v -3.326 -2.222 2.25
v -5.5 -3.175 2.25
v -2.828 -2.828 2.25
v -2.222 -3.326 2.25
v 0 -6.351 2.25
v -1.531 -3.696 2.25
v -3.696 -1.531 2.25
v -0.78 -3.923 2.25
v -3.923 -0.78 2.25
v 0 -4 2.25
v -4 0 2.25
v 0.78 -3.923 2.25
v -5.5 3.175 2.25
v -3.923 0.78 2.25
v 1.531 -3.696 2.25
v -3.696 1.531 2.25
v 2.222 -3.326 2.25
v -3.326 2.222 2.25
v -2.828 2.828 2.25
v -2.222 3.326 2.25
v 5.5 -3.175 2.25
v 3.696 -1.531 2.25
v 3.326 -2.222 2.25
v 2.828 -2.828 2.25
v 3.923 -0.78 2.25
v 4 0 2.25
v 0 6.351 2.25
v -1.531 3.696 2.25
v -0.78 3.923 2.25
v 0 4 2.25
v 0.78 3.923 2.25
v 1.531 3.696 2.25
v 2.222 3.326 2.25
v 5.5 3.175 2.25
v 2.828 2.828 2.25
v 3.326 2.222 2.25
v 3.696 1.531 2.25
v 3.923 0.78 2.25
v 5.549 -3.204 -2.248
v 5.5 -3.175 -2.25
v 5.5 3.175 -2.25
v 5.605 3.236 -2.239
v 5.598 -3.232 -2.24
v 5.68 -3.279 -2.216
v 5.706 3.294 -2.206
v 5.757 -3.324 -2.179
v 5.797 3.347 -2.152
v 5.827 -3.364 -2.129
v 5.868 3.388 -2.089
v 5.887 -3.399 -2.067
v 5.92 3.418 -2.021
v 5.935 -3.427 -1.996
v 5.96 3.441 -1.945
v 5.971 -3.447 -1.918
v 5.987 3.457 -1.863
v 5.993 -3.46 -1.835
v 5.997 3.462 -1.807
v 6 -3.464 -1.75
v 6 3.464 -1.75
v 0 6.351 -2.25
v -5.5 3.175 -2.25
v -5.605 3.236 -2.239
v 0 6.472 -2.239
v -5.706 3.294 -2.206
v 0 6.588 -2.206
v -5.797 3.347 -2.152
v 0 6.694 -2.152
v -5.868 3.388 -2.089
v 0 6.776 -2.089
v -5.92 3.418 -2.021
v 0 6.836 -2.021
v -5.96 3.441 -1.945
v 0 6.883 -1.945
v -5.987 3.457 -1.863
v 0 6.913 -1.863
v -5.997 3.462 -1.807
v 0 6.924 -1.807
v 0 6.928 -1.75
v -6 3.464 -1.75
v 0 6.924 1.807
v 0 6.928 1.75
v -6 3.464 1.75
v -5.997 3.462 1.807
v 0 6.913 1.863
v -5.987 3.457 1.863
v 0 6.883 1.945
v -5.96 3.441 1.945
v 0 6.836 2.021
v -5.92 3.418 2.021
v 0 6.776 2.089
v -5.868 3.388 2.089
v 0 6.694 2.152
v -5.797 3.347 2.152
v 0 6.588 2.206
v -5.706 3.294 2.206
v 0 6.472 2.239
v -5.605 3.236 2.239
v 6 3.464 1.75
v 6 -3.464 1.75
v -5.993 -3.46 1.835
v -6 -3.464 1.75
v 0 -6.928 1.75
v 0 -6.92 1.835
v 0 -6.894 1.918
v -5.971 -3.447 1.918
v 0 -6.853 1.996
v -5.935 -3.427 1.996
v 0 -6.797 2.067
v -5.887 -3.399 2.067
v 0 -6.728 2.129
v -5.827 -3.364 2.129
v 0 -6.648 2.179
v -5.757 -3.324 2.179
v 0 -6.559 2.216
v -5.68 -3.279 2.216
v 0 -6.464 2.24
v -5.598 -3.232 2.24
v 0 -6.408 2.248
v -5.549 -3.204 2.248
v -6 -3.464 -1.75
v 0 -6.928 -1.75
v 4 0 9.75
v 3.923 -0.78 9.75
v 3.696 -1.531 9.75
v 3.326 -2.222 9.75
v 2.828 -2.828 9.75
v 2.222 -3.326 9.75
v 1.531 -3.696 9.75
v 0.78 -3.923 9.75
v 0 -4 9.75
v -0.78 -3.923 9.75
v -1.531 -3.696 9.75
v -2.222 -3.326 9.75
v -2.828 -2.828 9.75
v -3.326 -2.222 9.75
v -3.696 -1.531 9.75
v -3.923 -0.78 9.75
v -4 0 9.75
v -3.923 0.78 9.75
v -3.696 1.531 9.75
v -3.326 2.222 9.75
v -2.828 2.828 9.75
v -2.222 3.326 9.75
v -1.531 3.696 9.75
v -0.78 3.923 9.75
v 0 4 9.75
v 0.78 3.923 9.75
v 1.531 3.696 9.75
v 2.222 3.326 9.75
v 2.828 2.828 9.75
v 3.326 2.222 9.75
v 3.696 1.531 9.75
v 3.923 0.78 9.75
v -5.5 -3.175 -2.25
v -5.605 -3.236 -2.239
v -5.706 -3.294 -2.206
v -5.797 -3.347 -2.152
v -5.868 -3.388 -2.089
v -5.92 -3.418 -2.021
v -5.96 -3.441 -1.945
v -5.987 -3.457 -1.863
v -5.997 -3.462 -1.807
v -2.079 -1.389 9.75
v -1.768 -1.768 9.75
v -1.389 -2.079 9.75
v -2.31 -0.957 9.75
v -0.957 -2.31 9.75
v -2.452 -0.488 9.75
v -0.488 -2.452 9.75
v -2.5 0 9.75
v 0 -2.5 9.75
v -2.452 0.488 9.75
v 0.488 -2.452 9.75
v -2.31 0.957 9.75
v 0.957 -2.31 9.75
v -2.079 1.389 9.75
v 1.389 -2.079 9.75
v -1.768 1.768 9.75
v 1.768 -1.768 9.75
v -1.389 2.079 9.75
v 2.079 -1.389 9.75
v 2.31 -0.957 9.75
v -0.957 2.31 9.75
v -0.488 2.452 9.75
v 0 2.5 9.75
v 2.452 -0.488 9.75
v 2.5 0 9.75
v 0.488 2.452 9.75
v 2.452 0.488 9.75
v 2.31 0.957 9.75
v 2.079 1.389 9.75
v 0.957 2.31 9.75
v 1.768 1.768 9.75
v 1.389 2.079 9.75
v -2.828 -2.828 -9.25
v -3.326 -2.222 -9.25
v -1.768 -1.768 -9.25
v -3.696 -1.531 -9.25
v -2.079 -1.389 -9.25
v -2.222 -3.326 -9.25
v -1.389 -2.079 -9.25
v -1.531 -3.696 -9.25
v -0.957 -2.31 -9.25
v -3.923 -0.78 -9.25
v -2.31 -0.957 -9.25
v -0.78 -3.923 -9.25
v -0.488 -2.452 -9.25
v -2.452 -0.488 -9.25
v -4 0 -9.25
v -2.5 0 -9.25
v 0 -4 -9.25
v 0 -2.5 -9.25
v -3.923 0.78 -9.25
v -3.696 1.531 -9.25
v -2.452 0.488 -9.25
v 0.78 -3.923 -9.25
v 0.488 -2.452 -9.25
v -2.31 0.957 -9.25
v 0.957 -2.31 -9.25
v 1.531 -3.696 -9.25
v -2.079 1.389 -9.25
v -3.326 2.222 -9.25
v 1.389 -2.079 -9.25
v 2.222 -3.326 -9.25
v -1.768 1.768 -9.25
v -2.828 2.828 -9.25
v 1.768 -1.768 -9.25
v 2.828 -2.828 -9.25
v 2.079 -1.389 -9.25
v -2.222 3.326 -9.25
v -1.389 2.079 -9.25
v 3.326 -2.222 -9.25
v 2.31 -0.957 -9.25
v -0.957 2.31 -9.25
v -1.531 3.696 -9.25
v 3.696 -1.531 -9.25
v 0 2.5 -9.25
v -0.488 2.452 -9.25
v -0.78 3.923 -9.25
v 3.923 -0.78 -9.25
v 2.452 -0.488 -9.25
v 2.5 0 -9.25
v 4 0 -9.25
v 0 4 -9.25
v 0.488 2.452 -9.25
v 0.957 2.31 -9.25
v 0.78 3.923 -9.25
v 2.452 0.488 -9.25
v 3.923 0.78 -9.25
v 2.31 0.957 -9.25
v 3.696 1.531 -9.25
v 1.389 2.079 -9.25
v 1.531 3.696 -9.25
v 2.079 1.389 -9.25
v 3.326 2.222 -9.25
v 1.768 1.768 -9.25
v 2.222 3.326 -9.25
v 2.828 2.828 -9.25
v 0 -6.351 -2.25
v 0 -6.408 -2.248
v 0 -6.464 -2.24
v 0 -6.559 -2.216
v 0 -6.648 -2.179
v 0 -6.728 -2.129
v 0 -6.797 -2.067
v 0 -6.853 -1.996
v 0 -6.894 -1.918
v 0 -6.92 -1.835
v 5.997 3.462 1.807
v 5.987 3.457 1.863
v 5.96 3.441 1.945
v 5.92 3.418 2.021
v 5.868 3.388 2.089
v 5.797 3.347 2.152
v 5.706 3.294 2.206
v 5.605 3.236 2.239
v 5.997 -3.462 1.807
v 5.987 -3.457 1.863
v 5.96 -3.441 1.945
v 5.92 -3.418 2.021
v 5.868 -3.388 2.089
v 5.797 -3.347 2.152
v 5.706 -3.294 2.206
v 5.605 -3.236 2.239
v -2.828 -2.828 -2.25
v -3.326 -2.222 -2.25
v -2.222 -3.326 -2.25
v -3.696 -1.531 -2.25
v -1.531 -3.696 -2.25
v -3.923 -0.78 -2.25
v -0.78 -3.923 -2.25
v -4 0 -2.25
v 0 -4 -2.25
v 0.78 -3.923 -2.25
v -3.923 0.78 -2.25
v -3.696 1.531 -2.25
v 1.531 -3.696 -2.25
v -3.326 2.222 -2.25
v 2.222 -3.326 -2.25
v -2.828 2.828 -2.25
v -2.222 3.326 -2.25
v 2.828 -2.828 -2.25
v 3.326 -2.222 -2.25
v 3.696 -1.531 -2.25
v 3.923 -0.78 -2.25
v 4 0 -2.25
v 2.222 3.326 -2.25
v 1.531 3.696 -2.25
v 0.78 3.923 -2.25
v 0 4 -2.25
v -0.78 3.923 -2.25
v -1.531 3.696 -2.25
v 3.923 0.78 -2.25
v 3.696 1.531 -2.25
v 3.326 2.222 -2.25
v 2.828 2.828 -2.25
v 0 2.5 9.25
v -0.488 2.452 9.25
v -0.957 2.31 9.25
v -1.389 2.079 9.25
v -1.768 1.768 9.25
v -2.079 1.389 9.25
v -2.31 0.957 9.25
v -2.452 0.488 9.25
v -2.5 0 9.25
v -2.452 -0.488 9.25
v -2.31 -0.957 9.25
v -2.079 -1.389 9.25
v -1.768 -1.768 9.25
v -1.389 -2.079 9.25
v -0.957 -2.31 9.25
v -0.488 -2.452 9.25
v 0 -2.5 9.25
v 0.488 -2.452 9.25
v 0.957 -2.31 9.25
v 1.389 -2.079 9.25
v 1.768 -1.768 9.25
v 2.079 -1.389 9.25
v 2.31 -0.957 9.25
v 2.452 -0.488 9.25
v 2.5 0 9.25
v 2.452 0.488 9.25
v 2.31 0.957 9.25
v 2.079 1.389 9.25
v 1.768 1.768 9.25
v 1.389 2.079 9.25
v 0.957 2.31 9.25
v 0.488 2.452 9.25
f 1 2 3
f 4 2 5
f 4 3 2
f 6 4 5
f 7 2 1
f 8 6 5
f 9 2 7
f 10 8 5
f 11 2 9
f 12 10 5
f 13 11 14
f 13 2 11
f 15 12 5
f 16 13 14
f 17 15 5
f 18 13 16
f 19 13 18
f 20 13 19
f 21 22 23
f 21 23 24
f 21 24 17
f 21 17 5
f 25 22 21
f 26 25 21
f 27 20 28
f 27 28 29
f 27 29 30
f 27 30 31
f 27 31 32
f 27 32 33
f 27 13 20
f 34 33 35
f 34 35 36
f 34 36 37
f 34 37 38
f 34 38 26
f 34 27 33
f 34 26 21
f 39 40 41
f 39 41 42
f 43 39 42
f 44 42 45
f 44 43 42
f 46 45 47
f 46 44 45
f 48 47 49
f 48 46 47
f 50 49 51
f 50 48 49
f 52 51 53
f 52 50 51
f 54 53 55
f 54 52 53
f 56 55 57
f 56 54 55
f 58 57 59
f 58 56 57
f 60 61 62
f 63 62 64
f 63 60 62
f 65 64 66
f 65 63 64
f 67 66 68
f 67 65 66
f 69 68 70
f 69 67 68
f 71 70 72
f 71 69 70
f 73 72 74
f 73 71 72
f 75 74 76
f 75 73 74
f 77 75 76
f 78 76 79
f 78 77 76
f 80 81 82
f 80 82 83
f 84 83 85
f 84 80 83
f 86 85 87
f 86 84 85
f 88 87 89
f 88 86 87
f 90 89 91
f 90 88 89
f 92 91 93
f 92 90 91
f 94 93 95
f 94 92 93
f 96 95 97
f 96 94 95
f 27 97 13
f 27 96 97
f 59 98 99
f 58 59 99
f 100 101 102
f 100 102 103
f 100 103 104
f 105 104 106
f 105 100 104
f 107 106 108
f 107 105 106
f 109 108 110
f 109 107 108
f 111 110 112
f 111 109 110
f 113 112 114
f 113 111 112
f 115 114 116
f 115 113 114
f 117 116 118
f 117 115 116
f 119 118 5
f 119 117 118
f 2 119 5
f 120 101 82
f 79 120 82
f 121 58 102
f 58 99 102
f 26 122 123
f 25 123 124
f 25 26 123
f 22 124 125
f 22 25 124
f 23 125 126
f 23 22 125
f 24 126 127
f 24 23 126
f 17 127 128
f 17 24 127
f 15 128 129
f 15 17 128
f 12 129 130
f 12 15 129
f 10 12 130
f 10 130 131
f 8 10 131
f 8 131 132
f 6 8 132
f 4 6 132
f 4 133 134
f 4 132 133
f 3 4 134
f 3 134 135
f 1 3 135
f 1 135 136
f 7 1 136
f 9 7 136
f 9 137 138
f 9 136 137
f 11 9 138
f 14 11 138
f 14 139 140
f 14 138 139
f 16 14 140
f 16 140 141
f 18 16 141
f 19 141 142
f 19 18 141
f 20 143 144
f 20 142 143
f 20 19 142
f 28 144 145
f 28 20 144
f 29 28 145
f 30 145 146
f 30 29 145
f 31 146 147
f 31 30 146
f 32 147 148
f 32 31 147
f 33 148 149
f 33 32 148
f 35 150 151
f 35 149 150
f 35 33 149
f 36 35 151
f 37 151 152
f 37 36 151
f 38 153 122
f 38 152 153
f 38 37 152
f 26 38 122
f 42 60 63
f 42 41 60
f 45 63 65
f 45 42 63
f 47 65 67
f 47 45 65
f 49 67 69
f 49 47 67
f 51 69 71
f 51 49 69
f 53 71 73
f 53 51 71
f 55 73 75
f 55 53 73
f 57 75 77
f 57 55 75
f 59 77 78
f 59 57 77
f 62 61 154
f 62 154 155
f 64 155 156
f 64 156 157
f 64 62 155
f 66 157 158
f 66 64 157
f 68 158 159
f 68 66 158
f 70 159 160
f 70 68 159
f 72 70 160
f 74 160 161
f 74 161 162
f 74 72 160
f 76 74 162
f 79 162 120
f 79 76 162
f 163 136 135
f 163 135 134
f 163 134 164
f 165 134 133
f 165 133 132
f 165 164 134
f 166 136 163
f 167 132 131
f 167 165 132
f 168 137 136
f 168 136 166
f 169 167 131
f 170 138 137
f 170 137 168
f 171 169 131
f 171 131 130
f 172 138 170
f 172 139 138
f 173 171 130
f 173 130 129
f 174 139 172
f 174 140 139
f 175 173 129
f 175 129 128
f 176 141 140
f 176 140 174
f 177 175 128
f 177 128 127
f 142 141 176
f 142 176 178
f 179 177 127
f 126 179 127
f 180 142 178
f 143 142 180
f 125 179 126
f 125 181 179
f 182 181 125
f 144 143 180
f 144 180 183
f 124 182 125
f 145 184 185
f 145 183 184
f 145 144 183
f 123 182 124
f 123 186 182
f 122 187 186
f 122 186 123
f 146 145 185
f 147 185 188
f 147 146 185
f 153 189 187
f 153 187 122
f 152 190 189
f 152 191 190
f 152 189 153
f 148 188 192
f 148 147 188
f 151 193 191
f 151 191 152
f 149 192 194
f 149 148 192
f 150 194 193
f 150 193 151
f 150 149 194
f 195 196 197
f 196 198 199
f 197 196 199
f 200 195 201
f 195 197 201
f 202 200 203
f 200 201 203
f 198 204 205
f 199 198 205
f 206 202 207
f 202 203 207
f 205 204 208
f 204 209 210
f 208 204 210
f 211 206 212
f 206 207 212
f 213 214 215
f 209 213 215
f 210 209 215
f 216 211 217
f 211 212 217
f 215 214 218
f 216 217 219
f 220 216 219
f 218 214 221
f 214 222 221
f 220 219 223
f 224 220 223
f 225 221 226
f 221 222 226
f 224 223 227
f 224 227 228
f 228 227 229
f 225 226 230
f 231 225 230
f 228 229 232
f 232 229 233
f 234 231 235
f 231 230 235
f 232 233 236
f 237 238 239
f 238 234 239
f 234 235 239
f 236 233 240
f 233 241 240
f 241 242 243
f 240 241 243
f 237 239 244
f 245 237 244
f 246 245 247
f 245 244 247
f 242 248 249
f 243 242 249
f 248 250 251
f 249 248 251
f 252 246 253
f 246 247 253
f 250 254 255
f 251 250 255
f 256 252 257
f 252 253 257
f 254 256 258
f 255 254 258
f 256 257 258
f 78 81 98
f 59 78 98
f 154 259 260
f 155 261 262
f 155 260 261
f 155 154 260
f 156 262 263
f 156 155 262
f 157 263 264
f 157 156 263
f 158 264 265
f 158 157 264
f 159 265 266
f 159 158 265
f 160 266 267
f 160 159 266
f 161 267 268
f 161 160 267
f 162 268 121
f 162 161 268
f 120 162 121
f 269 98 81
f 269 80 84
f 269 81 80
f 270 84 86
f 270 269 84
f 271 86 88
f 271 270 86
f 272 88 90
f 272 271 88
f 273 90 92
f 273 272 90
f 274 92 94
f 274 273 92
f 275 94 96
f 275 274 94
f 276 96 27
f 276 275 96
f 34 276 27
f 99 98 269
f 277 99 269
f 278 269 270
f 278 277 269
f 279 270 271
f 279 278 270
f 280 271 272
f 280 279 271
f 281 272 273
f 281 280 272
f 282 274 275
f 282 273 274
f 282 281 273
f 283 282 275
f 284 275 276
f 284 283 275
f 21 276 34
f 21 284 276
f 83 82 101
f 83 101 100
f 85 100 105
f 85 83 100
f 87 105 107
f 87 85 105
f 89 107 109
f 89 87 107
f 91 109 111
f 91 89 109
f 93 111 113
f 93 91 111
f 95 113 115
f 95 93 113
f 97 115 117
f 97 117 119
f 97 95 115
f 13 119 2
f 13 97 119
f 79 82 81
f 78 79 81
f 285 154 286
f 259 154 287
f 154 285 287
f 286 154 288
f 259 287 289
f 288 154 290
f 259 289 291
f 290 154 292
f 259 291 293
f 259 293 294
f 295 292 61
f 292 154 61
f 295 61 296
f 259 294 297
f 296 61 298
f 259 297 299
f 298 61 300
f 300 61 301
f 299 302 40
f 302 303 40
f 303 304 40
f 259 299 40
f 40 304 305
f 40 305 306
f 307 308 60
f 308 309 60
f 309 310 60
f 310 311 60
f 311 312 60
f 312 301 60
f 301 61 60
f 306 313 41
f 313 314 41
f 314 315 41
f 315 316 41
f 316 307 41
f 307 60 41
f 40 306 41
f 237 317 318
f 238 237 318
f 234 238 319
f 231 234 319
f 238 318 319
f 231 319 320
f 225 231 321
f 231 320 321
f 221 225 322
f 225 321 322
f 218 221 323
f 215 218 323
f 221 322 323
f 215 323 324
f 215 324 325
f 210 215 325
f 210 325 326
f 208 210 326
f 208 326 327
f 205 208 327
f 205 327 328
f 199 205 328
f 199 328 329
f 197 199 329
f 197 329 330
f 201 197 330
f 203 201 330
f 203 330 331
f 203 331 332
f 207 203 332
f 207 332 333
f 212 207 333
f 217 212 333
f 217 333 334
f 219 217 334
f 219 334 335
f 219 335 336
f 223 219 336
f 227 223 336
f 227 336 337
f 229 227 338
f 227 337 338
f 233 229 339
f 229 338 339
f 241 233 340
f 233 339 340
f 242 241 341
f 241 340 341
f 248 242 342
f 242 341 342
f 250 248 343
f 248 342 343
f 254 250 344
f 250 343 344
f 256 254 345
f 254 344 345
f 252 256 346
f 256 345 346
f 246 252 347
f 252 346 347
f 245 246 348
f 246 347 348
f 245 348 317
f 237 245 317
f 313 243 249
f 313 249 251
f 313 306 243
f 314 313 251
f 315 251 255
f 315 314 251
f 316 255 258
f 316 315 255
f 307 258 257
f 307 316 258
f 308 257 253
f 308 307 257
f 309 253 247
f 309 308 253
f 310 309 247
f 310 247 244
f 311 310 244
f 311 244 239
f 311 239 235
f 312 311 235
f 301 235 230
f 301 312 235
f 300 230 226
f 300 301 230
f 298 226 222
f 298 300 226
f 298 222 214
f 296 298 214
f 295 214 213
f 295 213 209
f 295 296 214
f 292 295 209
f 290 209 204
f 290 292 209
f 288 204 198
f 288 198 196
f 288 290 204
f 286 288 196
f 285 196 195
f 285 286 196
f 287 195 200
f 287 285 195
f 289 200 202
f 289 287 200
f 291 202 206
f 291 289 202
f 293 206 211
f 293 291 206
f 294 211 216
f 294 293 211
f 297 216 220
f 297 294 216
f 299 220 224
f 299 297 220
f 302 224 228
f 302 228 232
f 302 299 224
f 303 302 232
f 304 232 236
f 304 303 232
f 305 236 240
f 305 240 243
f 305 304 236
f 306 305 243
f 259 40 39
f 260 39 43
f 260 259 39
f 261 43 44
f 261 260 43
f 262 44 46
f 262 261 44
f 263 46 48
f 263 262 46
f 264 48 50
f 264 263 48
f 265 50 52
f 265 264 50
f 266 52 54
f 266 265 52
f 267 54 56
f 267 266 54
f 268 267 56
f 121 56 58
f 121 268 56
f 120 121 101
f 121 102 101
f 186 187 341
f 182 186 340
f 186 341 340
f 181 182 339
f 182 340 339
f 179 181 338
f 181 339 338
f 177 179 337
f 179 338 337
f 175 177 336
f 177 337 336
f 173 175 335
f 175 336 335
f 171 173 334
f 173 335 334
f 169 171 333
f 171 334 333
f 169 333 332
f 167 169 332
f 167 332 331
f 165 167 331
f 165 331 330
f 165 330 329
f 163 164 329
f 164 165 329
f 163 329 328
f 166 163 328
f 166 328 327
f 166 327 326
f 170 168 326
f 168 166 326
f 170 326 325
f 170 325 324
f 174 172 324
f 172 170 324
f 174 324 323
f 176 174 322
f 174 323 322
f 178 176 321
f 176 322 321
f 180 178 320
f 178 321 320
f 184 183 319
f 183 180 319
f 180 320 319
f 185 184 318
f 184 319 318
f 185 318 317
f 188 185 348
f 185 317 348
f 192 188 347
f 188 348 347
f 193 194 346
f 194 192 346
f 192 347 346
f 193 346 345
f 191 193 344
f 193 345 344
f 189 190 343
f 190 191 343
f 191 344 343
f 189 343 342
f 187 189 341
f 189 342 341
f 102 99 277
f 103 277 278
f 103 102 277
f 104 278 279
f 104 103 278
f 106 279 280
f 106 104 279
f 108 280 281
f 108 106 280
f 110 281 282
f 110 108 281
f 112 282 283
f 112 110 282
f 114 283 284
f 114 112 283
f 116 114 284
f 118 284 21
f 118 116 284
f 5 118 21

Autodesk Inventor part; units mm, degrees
ref_plane "YZ Plane" through (0, 0, 0) normal (1, 0, 0) x (0, 1, 0)
ref_plane "XZ Plane" through (0, 0, 0) normal (0, 1, 0) x (-1, 0, 0)
ref_plane "XY Plane" through (0, 0, 0) normal (0, 0, 1) x (1, 0, 0)
sketch "Sketch1" plane through (0, 0, 0) normal (0, 0, 1) x (1, 0, 0)
  line L0 (0, -6.9282) -> (-6, -3.4641)
  line L1 (-6, -3.4641) -> (-6, 3.4641)
  line L2 (-6, 3.4641) -> (0, 6.9282)
  line L3 (0, 6.9282) -> (6, 3.4641)
  line L4 (6, 3.4641) -> (6, -3.4641)
  line L5 (6, -3.4641) -> (0, -6.9282)
  circle A0 centre (0, 0) radius 4
  dimension "d0" = 12
  dimension "d1" = 8
extrude "Extrusion1" add sketch "Sketch1" along normal mid plane 4.5 contours L0 L1 L2 L3 L4 L5 | A0
extrude "Extrusion2" add sketch "Sketch1" along normal mid plane 18.5 contours A0
thread "Thread1" size "M8x1.25" class "6g" standard "ANSI Metric M Profile" full length
sketch "Sketch2" plane through (0, 0, -9.25) normal (0, 0, -1) x (-1, 0, 0)
  point P0 (0, 0)
hole "Hole1" at (0, 0, -9.25) direction (0, 0, 1) diameter 5 end through all
fillet "Fillet1" radius 0.5 12 edges at (-6, 0, -2.25) (-3, -5.1962, -2.25) (3, -5.1962, -2.25) (-3, 5.1962, -2.25) (6, 0, -2.25) (3, 5.1962, -2.25) (-3, 5.1962, 2.25) (3, 5.1962, 2.25) (6, 0, 2.25) (3, -5.1962, 2.25) (-3, -5.1962, 2.25) (-6, 0, 2.25)
sketch "Sketch3" plane through (0, 0, 9.25) normal (0, 0, 1) x (1, 0, 0)
  circle A0 centre (0, 0) radius 4
  circle A1 centre (0, 0) radius 2.5
  dimension "d16" = 8
  dimension "d17" = 5
extrude "Extrusion3" add sketch "Sketch3" along normal blind 0.5
thread "Thread2" size "M8x1.25" class "6g" standard "ANSI Metric M Profile" full length
properties part number "HUDSON-1-82"
